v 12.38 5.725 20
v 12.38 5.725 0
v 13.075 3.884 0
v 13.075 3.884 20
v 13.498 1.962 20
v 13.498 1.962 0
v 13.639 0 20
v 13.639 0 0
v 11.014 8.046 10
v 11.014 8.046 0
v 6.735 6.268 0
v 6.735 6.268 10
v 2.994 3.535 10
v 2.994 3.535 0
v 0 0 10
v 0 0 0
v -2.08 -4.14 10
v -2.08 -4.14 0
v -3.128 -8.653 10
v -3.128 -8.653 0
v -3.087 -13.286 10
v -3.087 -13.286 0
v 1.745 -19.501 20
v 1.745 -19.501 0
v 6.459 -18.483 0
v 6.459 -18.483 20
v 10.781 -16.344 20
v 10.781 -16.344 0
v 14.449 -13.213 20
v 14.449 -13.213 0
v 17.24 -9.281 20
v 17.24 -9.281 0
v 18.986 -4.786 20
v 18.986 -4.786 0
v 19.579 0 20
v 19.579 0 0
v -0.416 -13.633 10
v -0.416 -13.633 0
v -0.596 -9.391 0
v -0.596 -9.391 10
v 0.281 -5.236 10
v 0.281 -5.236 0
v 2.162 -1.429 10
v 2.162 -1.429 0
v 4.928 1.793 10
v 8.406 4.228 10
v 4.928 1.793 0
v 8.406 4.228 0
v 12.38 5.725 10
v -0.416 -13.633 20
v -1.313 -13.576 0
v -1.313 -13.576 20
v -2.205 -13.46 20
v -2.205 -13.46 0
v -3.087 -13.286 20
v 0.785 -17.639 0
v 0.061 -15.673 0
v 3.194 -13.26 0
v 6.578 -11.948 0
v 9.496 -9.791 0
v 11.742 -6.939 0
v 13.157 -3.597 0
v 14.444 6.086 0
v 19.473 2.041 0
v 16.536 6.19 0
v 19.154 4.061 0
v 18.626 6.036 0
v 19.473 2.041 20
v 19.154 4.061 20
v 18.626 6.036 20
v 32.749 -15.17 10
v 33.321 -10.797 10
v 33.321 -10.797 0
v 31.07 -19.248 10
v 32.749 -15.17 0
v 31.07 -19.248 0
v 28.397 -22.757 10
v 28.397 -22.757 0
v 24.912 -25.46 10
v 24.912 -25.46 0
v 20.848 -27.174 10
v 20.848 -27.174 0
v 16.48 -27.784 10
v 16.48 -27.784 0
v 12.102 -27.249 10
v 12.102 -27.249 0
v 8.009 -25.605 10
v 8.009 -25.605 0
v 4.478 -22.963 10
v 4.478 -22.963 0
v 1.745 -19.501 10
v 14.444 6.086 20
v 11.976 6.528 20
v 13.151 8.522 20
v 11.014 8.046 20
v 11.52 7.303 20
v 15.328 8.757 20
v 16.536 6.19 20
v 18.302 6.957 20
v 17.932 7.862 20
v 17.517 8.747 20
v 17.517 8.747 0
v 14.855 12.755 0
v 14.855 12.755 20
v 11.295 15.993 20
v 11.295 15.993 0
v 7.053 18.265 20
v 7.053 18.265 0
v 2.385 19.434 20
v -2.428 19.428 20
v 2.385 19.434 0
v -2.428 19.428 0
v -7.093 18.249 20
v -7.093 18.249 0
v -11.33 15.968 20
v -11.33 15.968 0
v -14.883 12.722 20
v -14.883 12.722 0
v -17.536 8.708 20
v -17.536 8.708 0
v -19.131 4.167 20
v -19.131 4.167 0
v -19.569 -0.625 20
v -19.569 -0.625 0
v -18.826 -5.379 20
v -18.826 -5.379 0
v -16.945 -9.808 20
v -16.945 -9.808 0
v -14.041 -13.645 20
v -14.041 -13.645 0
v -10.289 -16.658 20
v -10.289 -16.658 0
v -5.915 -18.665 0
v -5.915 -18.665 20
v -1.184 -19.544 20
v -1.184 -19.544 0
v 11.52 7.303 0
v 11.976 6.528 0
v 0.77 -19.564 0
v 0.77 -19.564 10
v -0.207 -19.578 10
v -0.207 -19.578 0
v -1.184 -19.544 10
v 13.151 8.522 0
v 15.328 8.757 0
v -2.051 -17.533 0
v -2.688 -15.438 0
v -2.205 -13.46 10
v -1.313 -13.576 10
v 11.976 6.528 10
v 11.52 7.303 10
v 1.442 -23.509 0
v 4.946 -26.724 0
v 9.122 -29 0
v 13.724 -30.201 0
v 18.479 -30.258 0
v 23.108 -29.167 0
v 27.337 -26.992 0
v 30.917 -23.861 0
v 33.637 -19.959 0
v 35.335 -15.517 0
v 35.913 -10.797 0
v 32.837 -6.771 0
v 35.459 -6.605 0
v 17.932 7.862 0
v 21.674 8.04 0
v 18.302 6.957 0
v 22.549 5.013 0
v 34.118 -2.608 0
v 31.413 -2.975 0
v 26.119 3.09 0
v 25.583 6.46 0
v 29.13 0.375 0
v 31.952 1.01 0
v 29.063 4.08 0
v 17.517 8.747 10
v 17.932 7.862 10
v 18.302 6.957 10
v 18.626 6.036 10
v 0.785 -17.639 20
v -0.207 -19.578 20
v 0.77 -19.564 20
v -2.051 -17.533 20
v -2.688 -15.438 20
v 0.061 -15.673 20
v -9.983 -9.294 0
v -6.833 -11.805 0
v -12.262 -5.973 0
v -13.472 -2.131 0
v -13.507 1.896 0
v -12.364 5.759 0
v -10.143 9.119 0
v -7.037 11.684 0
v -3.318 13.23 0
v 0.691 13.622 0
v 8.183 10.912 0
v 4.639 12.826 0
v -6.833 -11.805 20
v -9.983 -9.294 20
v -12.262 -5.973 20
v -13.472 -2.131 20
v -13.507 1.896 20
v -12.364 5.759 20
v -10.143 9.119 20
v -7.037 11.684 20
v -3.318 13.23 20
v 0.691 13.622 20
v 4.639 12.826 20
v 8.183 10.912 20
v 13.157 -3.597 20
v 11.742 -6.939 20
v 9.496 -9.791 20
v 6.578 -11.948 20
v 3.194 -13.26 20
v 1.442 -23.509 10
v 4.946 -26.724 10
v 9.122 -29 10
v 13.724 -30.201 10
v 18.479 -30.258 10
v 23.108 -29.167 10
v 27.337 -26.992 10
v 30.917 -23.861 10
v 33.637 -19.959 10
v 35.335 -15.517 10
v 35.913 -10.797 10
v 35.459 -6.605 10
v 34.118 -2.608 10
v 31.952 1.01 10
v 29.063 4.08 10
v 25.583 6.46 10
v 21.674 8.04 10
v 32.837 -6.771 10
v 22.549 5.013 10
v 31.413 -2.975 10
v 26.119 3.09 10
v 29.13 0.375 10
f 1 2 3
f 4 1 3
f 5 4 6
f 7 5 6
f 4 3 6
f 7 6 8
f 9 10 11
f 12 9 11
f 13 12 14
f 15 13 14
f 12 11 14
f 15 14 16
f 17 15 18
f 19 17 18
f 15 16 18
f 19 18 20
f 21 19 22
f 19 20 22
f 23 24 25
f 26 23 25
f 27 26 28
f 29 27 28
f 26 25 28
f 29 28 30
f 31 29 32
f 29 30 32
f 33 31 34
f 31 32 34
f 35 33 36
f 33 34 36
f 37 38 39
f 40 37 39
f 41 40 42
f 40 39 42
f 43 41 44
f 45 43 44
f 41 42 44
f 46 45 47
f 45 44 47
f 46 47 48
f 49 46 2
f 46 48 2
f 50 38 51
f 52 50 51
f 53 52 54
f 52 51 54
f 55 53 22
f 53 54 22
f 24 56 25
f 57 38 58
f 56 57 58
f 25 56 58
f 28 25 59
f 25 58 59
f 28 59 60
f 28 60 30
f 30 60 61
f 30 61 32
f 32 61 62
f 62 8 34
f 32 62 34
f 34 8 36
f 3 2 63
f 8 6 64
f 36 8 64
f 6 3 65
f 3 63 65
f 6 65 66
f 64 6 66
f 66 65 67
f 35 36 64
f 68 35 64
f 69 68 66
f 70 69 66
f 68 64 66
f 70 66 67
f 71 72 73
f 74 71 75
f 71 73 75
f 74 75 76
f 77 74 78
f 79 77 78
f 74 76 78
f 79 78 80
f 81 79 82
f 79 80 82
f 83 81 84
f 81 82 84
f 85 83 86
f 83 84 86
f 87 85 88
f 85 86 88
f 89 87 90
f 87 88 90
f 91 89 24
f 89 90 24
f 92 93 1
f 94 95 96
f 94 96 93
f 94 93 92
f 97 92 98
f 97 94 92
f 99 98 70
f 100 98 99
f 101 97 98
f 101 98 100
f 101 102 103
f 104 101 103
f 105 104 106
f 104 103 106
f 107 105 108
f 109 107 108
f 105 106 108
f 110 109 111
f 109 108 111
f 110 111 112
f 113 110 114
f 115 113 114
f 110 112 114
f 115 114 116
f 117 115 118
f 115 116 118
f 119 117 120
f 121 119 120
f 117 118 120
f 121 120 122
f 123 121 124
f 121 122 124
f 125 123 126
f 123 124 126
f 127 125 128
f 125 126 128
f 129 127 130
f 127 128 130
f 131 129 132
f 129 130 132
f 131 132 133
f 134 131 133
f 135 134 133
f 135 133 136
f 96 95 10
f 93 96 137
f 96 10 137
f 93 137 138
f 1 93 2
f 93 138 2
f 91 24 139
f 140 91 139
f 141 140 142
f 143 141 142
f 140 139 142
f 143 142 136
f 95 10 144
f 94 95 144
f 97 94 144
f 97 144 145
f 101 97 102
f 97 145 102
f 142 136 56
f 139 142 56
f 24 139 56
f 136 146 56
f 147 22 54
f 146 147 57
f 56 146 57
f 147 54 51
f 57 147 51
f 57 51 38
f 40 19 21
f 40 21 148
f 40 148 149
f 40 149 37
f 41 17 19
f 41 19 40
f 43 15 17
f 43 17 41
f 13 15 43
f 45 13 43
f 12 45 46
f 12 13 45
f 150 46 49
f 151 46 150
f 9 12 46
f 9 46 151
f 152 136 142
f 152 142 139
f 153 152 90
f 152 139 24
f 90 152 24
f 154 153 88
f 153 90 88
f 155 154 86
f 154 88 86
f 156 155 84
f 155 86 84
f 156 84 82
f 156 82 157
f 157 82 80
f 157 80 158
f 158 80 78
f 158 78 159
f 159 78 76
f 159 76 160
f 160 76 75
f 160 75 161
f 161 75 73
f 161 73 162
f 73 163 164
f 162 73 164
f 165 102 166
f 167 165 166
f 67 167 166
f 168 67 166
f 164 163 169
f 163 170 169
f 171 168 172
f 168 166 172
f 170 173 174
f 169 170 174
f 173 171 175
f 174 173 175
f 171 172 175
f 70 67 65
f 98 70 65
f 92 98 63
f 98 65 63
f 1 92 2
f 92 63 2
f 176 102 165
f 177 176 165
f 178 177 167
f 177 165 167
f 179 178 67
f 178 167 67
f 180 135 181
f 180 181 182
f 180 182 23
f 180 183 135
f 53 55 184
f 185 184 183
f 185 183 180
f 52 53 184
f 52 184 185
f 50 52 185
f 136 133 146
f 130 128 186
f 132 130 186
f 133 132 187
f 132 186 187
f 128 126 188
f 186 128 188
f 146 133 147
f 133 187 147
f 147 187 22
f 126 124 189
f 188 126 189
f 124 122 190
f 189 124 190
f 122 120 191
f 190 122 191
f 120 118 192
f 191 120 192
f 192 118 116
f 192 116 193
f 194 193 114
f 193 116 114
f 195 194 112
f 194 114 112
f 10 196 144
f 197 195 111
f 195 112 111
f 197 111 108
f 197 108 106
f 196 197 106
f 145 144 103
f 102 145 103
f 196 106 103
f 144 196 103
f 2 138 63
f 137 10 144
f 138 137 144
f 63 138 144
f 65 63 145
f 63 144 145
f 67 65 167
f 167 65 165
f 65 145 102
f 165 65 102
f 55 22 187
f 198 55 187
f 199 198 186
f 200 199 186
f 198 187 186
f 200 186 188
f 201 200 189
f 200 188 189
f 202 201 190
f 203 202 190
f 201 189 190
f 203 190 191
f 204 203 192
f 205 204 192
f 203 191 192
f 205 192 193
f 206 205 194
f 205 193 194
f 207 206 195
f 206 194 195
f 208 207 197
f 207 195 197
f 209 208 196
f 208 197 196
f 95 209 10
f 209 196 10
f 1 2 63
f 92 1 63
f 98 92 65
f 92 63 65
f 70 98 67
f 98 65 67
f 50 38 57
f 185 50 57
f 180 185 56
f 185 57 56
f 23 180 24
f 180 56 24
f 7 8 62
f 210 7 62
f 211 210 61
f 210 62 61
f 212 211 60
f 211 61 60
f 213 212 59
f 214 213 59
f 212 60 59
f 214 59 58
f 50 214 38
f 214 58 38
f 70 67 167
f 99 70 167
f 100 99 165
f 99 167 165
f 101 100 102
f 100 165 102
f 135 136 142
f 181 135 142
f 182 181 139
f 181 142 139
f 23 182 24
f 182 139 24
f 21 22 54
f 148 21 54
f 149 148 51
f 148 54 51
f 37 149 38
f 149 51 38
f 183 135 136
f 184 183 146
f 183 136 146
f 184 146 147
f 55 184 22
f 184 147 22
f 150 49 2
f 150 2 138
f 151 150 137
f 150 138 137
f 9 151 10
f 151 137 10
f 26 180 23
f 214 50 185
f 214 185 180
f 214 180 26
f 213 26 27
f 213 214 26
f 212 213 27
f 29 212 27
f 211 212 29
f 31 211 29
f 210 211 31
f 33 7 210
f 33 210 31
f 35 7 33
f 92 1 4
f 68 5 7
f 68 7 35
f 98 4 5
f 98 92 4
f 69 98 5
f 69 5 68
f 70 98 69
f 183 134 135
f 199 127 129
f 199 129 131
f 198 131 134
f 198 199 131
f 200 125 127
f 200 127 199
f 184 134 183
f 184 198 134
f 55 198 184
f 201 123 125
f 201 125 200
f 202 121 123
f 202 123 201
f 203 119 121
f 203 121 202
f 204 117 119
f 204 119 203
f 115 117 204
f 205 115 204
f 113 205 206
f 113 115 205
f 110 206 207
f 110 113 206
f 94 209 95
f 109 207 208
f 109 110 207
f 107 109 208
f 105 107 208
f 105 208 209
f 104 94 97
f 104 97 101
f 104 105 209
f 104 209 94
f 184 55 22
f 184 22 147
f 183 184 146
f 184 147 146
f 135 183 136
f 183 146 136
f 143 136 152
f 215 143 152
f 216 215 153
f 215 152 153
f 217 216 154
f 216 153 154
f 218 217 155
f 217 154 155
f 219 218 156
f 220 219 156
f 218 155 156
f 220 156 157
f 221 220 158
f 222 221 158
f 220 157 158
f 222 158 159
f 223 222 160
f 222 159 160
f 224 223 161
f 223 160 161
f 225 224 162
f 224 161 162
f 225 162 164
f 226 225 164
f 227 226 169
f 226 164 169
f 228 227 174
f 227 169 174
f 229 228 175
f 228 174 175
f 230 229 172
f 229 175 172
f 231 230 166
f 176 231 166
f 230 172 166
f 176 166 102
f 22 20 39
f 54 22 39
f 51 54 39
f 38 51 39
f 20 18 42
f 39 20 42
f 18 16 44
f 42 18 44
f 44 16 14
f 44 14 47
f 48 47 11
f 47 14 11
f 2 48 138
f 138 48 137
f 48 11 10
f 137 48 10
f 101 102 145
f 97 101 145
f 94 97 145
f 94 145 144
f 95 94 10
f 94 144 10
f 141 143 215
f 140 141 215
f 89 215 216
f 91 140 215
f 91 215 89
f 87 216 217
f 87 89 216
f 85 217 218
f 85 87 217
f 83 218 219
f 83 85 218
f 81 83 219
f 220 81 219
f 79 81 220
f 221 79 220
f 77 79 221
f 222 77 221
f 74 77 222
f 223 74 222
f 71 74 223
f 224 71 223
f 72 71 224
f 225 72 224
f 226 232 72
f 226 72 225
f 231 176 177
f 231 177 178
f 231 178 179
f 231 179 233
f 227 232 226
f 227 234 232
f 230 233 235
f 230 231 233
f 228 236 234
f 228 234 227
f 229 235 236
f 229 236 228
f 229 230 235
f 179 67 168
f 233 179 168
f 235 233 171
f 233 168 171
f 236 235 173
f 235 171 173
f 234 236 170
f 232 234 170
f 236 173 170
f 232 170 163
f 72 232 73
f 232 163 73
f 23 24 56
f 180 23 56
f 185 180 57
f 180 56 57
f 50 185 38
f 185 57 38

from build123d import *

# Parameters (mm, degrees)
F1_DEPTH = 20
F2_DEPTH = 20
F3_DEPTH = 20
F4_DEPTH = 20
F5_DEPTH = 10
F6_DEPTH = 10


with BuildPart() as f1:
    # F0 (on Top) → F1 (new body)
    with BuildSketch(Plane.XY):
        with BuildLine():
            ThreePointArc((11.0135375435, 8.0459521684), (14.2358136893, 8.6698464344), (17.5170326715, 8.7467203978))
            ThreePointArc((17.5170326715, 8.7467203978), (-16.3333984, 10.7968350936), (-1.1836342715, -19.5435554913))
            ThreePointArc((-1.1836342715, -19.5435554913), (-2.398584054, -16.494587692), (-3.087158825, -13.285511127))
            ThreePointArc((-3.087158825, -13.285511127), (-11.378255643, 7.5213465576), (11.0135375435, 8.0459521684))
        make_face()
    extrude(amount=F1_DEPTH)


with BuildPart() as f2:
    # F0 (on Top) → F2 (new body)
    with BuildSketch(Plane.XY):
        with BuildLine():
            ThreePointArc((1.745220777, -19.5014295827), (14.4485616362, -13.2132743094), (19.5793654476, 0))
            ThreePointArc((19.5793654476, 0), (19.3395265178, 3.0552030044), (18.6258855789, 6.0355561245))
            ThreePointArc((18.6258855789, 6.0355561245), (15.4885205684, 6.1699286825), (12.3800255295, 5.7245369599))
            ThreePointArc((12.3800255295, 5.7245369599), (13.3208941006, 2.9307227567), (13.6394778315, 0))
            ThreePointArc((13.6394778315, 0), (9.4963721158, -9.7905195039), (-0.4159388552, -13.6331342833))
            ThreePointArc((-0.4159388552, -13.6331342833), (0.3922823125, -16.667585426), (1.745220777, -19.5014295827))
        make_face()
    extrude(amount=F2_DEPTH)


with BuildPart() as f3:
    # F0 (on Top) → F3 (new body)
    with BuildSketch(Plane.XY):
        with BuildLine():
            ThreePointArc((-1.1836342715, -19.5435554913), (0.2815821351, -19.5773405454), (1.745220777, -19.5014295827))
            ThreePointArc((1.745220777, -19.5014295827), (0.3922823125, -16.667585426), (-0.4159388552, -13.6331342833))
            ThreePointArc((-0.4159388552, -13.6331342833), (-1.7601516423, -13.5254287072), (-3.087158825, -13.285511127))
            ThreePointArc((-3.087158825, -13.285511127), (-2.398584054, -16.494587692), (-1.1836342715, -19.5435554913))
        make_face()
    extrude(amount=F3_DEPTH)


with BuildPart() as f4:
    # F0 (on Top) → F4 (new body)
    with BuildSketch(Plane.XY):
        with BuildLine():
            ThreePointArc((12.3800255295, 5.7245369599), (15.4885205684, 6.1699286825), (18.6258855789, 6.0355561245))
            ThreePointArc((18.6258855789, 6.0355561245), (18.1222304875, 7.4119034996), (17.5170326715, 8.7467203978))
            ThreePointArc((17.5170326715, 8.7467203978), (14.2358136893, 8.6698464344), (11.0135375435, 8.0459521684))
            ThreePointArc((11.0135375435, 8.0459521684), (11.7542307471, 6.9190617183), (12.3800255295, 5.7245369599))
        make_face()
    extrude(amount=F4_DEPTH)


with BuildPart() as f5:
    # F0 (on Top) → F5 (new body)
    with BuildSketch(Plane.XY):
        with BuildLine():
            ThreePointArc((17.5170326715, 8.7467203978), (18.1222304875, 7.4119034996), (18.6258855789, 6.0355561245))
            ThreePointArc((18.6258855789, 6.0355561245), (29.130452249, 0.3754656708), (33.3211849416, -10.7968350936))
            ThreePointArc((33.3211849416, -10.7968350936), (20.8480436846, -27.1737355798), (1.745220777, -19.5014295827))
            ThreePointArc((1.745220777, -19.5014295827), (0.2815821351, -19.5773405454), (-1.1836342715, -19.5435554913))
            ThreePointArc((-1.1836342715, -19.5435554913), (20.8266804465, -29.8536440547), (35.9127638476, -10.7968350936))
            ThreePointArc((35.9127638476, -10.7968350936), (30.5904380522, 2.6228657856), (17.5170326715, 8.7467203978))
        make_face()
    extrude(amount=F5_DEPTH)


with BuildPart() as f6:
    # F0 (on Top) → F6 (new body)
    with BuildSketch(Plane.XY):
        with BuildLine():
            ThreePointArc((-0.4159388552, -13.6331342833), (2.1619337394, -1.4290989233), (12.3800255295, 5.7245369599))
            ThreePointArc((12.3800255295, 5.7245369599), (11.7542307471, 6.9190617183), (11.0135375435, 8.0459521684))
            ThreePointArc((11.0135375435, 8.0459521684), (0, 0), (-3.087158825, -13.285511127))
            ThreePointArc((-3.087158825, -13.285511127), (-1.7601516423, -13.5254287072), (-0.4159388552, -13.6331342833))
        make_face()
    extrude(amount=F6_DEPTH)


solid = Compound([f1.part, f2.part, f3.part, f4.part, f5.part, f6.part])
